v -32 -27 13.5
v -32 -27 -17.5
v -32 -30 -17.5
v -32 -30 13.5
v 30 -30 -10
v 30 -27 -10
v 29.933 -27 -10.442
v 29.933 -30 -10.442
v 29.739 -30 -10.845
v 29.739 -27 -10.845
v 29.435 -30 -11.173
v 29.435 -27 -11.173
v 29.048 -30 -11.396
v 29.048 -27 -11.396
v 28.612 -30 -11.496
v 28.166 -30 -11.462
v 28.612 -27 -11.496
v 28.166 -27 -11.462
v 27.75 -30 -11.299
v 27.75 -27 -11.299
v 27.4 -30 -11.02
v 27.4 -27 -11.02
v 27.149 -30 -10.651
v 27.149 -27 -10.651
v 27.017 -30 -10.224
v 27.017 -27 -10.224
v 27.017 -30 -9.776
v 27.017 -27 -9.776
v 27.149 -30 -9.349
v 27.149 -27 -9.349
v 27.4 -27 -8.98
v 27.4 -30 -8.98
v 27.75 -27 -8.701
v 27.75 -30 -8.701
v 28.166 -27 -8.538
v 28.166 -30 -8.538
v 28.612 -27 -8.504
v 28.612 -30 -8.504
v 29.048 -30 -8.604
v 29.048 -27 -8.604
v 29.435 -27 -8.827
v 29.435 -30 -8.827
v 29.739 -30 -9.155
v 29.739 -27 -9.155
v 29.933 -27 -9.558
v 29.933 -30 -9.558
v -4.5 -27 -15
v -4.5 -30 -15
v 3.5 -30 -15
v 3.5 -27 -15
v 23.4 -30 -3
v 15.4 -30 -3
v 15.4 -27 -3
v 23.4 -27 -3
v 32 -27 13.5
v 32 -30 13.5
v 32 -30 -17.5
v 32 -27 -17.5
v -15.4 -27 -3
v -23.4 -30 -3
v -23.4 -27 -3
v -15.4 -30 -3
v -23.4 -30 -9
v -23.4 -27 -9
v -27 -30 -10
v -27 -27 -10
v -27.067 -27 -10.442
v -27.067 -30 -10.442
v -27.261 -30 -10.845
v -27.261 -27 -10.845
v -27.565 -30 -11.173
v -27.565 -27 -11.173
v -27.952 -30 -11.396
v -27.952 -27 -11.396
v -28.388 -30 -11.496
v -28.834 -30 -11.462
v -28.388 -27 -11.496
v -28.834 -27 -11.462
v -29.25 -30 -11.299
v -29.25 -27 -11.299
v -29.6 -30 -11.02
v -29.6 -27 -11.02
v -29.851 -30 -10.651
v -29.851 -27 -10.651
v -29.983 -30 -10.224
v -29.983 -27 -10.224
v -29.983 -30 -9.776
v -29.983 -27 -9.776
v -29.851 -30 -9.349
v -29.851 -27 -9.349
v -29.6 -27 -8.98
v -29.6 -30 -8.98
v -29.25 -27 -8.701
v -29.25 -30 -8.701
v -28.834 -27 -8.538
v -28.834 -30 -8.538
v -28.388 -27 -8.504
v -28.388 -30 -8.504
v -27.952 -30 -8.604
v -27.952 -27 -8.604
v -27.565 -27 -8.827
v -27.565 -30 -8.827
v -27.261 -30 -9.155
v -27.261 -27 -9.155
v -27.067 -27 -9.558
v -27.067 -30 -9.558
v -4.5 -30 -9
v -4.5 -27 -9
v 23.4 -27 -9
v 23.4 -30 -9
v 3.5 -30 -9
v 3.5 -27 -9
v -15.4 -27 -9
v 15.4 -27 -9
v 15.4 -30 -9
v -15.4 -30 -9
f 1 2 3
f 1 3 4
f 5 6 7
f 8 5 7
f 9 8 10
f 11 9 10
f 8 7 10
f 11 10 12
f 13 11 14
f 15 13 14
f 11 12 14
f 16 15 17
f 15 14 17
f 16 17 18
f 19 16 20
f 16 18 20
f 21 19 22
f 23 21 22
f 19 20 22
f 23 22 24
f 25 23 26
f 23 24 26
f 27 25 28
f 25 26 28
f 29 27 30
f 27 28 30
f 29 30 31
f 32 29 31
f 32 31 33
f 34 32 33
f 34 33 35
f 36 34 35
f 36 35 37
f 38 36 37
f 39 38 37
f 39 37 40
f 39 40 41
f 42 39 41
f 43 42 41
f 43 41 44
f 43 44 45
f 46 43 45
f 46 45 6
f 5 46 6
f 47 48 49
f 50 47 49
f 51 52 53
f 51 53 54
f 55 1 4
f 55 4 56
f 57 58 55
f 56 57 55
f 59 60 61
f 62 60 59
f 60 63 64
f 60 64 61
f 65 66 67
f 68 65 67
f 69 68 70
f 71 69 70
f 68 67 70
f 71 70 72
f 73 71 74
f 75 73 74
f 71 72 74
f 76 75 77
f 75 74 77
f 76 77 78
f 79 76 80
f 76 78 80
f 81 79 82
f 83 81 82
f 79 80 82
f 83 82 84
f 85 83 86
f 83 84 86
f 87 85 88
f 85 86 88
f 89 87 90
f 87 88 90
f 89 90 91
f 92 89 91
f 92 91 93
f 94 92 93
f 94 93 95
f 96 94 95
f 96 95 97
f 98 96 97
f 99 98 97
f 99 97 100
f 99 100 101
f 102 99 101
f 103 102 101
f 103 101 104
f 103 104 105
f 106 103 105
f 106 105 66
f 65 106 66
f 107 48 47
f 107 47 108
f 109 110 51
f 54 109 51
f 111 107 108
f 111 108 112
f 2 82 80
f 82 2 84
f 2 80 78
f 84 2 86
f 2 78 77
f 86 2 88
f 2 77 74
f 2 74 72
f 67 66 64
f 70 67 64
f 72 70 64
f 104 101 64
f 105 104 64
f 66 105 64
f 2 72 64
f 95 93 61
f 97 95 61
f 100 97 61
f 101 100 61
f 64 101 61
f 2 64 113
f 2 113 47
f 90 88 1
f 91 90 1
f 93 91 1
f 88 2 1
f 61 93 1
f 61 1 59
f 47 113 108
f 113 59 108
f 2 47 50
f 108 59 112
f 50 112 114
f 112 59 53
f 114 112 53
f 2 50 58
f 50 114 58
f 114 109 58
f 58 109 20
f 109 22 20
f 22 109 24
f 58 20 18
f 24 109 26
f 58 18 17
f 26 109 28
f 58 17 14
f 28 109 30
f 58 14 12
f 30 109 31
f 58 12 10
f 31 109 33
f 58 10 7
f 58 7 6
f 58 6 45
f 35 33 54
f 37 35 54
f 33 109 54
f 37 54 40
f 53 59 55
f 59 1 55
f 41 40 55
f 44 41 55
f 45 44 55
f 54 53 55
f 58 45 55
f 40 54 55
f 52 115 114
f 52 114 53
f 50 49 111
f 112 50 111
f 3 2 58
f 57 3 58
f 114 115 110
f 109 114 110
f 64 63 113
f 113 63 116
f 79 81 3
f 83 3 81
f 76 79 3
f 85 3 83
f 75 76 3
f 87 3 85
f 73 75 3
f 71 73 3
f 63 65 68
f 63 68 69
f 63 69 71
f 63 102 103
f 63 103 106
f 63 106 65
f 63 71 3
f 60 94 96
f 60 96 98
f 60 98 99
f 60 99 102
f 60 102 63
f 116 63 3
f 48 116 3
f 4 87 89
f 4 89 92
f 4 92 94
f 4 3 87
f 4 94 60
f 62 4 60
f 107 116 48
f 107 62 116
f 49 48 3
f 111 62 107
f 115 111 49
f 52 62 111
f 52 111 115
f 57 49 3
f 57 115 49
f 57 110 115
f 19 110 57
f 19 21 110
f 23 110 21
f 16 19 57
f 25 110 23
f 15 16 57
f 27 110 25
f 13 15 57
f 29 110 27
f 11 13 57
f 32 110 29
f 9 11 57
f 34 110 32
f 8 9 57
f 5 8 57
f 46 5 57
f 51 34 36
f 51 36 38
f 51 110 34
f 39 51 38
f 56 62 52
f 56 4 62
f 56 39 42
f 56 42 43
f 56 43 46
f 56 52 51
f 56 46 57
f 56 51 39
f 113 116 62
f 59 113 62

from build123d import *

# Parameters (mm, degrees)
SKETCH012_W     = 64
SKETCH012_H     = 31
PAD006_DEPTH    = 3
SKETCH013_R     = 1.5
POCKET006_DEPTH = 5
SKETCH014_W     = 8
SKETCH014_H     = 6
POCKET007_DEPTH = 5


with BuildPart() as part:
    # Sketch012 → Pad006 (new body)
    with BuildSketch(Plane.XZ.offset(-30)):
        with Locations((0, -2)):
            Rectangle(SKETCH012_W, SKETCH012_H)
    extrude(amount=PAD006_DEPTH)

    # Sketch013 (on Face5 of Pad006) → Pocket006 (cut)
    with BuildSketch(Plane(origin=(0, 30, 0), x_dir=(1, 0, 0), z_dir=(0, 1, 0))):
        with Locations((28.5, 10)):
            Circle(SKETCH013_R)
        with Locations((-28.5, 10)):
            Circle(SKETCH013_R)
    extrude(amount=-POCKET006_DEPTH, mode=Mode.SUBTRACT)

    # Sketch014 (on Face5 of Pocket006) → Pocket007 (cut)
    with BuildSketch(Plane.XZ.offset(-27)):
        with Locations((19.4, -6)):
            Rectangle(SKETCH014_W, SKETCH014_H)
        with Locations((-0.5, -12)):
            Rectangle(SKETCH014_W, SKETCH014_H)
        with Locations((-19.4, -6)):
            Rectangle(SKETCH014_W, SKETCH014_H)
    extrude(amount=-POCKET007_DEPTH, mode=Mode.SUBTRACT)


with BuildPart() as part_1:
    # Body004 placement: moved
    add(part.part.moved(Location((0, -57, 0))))


solid = part_1.part
